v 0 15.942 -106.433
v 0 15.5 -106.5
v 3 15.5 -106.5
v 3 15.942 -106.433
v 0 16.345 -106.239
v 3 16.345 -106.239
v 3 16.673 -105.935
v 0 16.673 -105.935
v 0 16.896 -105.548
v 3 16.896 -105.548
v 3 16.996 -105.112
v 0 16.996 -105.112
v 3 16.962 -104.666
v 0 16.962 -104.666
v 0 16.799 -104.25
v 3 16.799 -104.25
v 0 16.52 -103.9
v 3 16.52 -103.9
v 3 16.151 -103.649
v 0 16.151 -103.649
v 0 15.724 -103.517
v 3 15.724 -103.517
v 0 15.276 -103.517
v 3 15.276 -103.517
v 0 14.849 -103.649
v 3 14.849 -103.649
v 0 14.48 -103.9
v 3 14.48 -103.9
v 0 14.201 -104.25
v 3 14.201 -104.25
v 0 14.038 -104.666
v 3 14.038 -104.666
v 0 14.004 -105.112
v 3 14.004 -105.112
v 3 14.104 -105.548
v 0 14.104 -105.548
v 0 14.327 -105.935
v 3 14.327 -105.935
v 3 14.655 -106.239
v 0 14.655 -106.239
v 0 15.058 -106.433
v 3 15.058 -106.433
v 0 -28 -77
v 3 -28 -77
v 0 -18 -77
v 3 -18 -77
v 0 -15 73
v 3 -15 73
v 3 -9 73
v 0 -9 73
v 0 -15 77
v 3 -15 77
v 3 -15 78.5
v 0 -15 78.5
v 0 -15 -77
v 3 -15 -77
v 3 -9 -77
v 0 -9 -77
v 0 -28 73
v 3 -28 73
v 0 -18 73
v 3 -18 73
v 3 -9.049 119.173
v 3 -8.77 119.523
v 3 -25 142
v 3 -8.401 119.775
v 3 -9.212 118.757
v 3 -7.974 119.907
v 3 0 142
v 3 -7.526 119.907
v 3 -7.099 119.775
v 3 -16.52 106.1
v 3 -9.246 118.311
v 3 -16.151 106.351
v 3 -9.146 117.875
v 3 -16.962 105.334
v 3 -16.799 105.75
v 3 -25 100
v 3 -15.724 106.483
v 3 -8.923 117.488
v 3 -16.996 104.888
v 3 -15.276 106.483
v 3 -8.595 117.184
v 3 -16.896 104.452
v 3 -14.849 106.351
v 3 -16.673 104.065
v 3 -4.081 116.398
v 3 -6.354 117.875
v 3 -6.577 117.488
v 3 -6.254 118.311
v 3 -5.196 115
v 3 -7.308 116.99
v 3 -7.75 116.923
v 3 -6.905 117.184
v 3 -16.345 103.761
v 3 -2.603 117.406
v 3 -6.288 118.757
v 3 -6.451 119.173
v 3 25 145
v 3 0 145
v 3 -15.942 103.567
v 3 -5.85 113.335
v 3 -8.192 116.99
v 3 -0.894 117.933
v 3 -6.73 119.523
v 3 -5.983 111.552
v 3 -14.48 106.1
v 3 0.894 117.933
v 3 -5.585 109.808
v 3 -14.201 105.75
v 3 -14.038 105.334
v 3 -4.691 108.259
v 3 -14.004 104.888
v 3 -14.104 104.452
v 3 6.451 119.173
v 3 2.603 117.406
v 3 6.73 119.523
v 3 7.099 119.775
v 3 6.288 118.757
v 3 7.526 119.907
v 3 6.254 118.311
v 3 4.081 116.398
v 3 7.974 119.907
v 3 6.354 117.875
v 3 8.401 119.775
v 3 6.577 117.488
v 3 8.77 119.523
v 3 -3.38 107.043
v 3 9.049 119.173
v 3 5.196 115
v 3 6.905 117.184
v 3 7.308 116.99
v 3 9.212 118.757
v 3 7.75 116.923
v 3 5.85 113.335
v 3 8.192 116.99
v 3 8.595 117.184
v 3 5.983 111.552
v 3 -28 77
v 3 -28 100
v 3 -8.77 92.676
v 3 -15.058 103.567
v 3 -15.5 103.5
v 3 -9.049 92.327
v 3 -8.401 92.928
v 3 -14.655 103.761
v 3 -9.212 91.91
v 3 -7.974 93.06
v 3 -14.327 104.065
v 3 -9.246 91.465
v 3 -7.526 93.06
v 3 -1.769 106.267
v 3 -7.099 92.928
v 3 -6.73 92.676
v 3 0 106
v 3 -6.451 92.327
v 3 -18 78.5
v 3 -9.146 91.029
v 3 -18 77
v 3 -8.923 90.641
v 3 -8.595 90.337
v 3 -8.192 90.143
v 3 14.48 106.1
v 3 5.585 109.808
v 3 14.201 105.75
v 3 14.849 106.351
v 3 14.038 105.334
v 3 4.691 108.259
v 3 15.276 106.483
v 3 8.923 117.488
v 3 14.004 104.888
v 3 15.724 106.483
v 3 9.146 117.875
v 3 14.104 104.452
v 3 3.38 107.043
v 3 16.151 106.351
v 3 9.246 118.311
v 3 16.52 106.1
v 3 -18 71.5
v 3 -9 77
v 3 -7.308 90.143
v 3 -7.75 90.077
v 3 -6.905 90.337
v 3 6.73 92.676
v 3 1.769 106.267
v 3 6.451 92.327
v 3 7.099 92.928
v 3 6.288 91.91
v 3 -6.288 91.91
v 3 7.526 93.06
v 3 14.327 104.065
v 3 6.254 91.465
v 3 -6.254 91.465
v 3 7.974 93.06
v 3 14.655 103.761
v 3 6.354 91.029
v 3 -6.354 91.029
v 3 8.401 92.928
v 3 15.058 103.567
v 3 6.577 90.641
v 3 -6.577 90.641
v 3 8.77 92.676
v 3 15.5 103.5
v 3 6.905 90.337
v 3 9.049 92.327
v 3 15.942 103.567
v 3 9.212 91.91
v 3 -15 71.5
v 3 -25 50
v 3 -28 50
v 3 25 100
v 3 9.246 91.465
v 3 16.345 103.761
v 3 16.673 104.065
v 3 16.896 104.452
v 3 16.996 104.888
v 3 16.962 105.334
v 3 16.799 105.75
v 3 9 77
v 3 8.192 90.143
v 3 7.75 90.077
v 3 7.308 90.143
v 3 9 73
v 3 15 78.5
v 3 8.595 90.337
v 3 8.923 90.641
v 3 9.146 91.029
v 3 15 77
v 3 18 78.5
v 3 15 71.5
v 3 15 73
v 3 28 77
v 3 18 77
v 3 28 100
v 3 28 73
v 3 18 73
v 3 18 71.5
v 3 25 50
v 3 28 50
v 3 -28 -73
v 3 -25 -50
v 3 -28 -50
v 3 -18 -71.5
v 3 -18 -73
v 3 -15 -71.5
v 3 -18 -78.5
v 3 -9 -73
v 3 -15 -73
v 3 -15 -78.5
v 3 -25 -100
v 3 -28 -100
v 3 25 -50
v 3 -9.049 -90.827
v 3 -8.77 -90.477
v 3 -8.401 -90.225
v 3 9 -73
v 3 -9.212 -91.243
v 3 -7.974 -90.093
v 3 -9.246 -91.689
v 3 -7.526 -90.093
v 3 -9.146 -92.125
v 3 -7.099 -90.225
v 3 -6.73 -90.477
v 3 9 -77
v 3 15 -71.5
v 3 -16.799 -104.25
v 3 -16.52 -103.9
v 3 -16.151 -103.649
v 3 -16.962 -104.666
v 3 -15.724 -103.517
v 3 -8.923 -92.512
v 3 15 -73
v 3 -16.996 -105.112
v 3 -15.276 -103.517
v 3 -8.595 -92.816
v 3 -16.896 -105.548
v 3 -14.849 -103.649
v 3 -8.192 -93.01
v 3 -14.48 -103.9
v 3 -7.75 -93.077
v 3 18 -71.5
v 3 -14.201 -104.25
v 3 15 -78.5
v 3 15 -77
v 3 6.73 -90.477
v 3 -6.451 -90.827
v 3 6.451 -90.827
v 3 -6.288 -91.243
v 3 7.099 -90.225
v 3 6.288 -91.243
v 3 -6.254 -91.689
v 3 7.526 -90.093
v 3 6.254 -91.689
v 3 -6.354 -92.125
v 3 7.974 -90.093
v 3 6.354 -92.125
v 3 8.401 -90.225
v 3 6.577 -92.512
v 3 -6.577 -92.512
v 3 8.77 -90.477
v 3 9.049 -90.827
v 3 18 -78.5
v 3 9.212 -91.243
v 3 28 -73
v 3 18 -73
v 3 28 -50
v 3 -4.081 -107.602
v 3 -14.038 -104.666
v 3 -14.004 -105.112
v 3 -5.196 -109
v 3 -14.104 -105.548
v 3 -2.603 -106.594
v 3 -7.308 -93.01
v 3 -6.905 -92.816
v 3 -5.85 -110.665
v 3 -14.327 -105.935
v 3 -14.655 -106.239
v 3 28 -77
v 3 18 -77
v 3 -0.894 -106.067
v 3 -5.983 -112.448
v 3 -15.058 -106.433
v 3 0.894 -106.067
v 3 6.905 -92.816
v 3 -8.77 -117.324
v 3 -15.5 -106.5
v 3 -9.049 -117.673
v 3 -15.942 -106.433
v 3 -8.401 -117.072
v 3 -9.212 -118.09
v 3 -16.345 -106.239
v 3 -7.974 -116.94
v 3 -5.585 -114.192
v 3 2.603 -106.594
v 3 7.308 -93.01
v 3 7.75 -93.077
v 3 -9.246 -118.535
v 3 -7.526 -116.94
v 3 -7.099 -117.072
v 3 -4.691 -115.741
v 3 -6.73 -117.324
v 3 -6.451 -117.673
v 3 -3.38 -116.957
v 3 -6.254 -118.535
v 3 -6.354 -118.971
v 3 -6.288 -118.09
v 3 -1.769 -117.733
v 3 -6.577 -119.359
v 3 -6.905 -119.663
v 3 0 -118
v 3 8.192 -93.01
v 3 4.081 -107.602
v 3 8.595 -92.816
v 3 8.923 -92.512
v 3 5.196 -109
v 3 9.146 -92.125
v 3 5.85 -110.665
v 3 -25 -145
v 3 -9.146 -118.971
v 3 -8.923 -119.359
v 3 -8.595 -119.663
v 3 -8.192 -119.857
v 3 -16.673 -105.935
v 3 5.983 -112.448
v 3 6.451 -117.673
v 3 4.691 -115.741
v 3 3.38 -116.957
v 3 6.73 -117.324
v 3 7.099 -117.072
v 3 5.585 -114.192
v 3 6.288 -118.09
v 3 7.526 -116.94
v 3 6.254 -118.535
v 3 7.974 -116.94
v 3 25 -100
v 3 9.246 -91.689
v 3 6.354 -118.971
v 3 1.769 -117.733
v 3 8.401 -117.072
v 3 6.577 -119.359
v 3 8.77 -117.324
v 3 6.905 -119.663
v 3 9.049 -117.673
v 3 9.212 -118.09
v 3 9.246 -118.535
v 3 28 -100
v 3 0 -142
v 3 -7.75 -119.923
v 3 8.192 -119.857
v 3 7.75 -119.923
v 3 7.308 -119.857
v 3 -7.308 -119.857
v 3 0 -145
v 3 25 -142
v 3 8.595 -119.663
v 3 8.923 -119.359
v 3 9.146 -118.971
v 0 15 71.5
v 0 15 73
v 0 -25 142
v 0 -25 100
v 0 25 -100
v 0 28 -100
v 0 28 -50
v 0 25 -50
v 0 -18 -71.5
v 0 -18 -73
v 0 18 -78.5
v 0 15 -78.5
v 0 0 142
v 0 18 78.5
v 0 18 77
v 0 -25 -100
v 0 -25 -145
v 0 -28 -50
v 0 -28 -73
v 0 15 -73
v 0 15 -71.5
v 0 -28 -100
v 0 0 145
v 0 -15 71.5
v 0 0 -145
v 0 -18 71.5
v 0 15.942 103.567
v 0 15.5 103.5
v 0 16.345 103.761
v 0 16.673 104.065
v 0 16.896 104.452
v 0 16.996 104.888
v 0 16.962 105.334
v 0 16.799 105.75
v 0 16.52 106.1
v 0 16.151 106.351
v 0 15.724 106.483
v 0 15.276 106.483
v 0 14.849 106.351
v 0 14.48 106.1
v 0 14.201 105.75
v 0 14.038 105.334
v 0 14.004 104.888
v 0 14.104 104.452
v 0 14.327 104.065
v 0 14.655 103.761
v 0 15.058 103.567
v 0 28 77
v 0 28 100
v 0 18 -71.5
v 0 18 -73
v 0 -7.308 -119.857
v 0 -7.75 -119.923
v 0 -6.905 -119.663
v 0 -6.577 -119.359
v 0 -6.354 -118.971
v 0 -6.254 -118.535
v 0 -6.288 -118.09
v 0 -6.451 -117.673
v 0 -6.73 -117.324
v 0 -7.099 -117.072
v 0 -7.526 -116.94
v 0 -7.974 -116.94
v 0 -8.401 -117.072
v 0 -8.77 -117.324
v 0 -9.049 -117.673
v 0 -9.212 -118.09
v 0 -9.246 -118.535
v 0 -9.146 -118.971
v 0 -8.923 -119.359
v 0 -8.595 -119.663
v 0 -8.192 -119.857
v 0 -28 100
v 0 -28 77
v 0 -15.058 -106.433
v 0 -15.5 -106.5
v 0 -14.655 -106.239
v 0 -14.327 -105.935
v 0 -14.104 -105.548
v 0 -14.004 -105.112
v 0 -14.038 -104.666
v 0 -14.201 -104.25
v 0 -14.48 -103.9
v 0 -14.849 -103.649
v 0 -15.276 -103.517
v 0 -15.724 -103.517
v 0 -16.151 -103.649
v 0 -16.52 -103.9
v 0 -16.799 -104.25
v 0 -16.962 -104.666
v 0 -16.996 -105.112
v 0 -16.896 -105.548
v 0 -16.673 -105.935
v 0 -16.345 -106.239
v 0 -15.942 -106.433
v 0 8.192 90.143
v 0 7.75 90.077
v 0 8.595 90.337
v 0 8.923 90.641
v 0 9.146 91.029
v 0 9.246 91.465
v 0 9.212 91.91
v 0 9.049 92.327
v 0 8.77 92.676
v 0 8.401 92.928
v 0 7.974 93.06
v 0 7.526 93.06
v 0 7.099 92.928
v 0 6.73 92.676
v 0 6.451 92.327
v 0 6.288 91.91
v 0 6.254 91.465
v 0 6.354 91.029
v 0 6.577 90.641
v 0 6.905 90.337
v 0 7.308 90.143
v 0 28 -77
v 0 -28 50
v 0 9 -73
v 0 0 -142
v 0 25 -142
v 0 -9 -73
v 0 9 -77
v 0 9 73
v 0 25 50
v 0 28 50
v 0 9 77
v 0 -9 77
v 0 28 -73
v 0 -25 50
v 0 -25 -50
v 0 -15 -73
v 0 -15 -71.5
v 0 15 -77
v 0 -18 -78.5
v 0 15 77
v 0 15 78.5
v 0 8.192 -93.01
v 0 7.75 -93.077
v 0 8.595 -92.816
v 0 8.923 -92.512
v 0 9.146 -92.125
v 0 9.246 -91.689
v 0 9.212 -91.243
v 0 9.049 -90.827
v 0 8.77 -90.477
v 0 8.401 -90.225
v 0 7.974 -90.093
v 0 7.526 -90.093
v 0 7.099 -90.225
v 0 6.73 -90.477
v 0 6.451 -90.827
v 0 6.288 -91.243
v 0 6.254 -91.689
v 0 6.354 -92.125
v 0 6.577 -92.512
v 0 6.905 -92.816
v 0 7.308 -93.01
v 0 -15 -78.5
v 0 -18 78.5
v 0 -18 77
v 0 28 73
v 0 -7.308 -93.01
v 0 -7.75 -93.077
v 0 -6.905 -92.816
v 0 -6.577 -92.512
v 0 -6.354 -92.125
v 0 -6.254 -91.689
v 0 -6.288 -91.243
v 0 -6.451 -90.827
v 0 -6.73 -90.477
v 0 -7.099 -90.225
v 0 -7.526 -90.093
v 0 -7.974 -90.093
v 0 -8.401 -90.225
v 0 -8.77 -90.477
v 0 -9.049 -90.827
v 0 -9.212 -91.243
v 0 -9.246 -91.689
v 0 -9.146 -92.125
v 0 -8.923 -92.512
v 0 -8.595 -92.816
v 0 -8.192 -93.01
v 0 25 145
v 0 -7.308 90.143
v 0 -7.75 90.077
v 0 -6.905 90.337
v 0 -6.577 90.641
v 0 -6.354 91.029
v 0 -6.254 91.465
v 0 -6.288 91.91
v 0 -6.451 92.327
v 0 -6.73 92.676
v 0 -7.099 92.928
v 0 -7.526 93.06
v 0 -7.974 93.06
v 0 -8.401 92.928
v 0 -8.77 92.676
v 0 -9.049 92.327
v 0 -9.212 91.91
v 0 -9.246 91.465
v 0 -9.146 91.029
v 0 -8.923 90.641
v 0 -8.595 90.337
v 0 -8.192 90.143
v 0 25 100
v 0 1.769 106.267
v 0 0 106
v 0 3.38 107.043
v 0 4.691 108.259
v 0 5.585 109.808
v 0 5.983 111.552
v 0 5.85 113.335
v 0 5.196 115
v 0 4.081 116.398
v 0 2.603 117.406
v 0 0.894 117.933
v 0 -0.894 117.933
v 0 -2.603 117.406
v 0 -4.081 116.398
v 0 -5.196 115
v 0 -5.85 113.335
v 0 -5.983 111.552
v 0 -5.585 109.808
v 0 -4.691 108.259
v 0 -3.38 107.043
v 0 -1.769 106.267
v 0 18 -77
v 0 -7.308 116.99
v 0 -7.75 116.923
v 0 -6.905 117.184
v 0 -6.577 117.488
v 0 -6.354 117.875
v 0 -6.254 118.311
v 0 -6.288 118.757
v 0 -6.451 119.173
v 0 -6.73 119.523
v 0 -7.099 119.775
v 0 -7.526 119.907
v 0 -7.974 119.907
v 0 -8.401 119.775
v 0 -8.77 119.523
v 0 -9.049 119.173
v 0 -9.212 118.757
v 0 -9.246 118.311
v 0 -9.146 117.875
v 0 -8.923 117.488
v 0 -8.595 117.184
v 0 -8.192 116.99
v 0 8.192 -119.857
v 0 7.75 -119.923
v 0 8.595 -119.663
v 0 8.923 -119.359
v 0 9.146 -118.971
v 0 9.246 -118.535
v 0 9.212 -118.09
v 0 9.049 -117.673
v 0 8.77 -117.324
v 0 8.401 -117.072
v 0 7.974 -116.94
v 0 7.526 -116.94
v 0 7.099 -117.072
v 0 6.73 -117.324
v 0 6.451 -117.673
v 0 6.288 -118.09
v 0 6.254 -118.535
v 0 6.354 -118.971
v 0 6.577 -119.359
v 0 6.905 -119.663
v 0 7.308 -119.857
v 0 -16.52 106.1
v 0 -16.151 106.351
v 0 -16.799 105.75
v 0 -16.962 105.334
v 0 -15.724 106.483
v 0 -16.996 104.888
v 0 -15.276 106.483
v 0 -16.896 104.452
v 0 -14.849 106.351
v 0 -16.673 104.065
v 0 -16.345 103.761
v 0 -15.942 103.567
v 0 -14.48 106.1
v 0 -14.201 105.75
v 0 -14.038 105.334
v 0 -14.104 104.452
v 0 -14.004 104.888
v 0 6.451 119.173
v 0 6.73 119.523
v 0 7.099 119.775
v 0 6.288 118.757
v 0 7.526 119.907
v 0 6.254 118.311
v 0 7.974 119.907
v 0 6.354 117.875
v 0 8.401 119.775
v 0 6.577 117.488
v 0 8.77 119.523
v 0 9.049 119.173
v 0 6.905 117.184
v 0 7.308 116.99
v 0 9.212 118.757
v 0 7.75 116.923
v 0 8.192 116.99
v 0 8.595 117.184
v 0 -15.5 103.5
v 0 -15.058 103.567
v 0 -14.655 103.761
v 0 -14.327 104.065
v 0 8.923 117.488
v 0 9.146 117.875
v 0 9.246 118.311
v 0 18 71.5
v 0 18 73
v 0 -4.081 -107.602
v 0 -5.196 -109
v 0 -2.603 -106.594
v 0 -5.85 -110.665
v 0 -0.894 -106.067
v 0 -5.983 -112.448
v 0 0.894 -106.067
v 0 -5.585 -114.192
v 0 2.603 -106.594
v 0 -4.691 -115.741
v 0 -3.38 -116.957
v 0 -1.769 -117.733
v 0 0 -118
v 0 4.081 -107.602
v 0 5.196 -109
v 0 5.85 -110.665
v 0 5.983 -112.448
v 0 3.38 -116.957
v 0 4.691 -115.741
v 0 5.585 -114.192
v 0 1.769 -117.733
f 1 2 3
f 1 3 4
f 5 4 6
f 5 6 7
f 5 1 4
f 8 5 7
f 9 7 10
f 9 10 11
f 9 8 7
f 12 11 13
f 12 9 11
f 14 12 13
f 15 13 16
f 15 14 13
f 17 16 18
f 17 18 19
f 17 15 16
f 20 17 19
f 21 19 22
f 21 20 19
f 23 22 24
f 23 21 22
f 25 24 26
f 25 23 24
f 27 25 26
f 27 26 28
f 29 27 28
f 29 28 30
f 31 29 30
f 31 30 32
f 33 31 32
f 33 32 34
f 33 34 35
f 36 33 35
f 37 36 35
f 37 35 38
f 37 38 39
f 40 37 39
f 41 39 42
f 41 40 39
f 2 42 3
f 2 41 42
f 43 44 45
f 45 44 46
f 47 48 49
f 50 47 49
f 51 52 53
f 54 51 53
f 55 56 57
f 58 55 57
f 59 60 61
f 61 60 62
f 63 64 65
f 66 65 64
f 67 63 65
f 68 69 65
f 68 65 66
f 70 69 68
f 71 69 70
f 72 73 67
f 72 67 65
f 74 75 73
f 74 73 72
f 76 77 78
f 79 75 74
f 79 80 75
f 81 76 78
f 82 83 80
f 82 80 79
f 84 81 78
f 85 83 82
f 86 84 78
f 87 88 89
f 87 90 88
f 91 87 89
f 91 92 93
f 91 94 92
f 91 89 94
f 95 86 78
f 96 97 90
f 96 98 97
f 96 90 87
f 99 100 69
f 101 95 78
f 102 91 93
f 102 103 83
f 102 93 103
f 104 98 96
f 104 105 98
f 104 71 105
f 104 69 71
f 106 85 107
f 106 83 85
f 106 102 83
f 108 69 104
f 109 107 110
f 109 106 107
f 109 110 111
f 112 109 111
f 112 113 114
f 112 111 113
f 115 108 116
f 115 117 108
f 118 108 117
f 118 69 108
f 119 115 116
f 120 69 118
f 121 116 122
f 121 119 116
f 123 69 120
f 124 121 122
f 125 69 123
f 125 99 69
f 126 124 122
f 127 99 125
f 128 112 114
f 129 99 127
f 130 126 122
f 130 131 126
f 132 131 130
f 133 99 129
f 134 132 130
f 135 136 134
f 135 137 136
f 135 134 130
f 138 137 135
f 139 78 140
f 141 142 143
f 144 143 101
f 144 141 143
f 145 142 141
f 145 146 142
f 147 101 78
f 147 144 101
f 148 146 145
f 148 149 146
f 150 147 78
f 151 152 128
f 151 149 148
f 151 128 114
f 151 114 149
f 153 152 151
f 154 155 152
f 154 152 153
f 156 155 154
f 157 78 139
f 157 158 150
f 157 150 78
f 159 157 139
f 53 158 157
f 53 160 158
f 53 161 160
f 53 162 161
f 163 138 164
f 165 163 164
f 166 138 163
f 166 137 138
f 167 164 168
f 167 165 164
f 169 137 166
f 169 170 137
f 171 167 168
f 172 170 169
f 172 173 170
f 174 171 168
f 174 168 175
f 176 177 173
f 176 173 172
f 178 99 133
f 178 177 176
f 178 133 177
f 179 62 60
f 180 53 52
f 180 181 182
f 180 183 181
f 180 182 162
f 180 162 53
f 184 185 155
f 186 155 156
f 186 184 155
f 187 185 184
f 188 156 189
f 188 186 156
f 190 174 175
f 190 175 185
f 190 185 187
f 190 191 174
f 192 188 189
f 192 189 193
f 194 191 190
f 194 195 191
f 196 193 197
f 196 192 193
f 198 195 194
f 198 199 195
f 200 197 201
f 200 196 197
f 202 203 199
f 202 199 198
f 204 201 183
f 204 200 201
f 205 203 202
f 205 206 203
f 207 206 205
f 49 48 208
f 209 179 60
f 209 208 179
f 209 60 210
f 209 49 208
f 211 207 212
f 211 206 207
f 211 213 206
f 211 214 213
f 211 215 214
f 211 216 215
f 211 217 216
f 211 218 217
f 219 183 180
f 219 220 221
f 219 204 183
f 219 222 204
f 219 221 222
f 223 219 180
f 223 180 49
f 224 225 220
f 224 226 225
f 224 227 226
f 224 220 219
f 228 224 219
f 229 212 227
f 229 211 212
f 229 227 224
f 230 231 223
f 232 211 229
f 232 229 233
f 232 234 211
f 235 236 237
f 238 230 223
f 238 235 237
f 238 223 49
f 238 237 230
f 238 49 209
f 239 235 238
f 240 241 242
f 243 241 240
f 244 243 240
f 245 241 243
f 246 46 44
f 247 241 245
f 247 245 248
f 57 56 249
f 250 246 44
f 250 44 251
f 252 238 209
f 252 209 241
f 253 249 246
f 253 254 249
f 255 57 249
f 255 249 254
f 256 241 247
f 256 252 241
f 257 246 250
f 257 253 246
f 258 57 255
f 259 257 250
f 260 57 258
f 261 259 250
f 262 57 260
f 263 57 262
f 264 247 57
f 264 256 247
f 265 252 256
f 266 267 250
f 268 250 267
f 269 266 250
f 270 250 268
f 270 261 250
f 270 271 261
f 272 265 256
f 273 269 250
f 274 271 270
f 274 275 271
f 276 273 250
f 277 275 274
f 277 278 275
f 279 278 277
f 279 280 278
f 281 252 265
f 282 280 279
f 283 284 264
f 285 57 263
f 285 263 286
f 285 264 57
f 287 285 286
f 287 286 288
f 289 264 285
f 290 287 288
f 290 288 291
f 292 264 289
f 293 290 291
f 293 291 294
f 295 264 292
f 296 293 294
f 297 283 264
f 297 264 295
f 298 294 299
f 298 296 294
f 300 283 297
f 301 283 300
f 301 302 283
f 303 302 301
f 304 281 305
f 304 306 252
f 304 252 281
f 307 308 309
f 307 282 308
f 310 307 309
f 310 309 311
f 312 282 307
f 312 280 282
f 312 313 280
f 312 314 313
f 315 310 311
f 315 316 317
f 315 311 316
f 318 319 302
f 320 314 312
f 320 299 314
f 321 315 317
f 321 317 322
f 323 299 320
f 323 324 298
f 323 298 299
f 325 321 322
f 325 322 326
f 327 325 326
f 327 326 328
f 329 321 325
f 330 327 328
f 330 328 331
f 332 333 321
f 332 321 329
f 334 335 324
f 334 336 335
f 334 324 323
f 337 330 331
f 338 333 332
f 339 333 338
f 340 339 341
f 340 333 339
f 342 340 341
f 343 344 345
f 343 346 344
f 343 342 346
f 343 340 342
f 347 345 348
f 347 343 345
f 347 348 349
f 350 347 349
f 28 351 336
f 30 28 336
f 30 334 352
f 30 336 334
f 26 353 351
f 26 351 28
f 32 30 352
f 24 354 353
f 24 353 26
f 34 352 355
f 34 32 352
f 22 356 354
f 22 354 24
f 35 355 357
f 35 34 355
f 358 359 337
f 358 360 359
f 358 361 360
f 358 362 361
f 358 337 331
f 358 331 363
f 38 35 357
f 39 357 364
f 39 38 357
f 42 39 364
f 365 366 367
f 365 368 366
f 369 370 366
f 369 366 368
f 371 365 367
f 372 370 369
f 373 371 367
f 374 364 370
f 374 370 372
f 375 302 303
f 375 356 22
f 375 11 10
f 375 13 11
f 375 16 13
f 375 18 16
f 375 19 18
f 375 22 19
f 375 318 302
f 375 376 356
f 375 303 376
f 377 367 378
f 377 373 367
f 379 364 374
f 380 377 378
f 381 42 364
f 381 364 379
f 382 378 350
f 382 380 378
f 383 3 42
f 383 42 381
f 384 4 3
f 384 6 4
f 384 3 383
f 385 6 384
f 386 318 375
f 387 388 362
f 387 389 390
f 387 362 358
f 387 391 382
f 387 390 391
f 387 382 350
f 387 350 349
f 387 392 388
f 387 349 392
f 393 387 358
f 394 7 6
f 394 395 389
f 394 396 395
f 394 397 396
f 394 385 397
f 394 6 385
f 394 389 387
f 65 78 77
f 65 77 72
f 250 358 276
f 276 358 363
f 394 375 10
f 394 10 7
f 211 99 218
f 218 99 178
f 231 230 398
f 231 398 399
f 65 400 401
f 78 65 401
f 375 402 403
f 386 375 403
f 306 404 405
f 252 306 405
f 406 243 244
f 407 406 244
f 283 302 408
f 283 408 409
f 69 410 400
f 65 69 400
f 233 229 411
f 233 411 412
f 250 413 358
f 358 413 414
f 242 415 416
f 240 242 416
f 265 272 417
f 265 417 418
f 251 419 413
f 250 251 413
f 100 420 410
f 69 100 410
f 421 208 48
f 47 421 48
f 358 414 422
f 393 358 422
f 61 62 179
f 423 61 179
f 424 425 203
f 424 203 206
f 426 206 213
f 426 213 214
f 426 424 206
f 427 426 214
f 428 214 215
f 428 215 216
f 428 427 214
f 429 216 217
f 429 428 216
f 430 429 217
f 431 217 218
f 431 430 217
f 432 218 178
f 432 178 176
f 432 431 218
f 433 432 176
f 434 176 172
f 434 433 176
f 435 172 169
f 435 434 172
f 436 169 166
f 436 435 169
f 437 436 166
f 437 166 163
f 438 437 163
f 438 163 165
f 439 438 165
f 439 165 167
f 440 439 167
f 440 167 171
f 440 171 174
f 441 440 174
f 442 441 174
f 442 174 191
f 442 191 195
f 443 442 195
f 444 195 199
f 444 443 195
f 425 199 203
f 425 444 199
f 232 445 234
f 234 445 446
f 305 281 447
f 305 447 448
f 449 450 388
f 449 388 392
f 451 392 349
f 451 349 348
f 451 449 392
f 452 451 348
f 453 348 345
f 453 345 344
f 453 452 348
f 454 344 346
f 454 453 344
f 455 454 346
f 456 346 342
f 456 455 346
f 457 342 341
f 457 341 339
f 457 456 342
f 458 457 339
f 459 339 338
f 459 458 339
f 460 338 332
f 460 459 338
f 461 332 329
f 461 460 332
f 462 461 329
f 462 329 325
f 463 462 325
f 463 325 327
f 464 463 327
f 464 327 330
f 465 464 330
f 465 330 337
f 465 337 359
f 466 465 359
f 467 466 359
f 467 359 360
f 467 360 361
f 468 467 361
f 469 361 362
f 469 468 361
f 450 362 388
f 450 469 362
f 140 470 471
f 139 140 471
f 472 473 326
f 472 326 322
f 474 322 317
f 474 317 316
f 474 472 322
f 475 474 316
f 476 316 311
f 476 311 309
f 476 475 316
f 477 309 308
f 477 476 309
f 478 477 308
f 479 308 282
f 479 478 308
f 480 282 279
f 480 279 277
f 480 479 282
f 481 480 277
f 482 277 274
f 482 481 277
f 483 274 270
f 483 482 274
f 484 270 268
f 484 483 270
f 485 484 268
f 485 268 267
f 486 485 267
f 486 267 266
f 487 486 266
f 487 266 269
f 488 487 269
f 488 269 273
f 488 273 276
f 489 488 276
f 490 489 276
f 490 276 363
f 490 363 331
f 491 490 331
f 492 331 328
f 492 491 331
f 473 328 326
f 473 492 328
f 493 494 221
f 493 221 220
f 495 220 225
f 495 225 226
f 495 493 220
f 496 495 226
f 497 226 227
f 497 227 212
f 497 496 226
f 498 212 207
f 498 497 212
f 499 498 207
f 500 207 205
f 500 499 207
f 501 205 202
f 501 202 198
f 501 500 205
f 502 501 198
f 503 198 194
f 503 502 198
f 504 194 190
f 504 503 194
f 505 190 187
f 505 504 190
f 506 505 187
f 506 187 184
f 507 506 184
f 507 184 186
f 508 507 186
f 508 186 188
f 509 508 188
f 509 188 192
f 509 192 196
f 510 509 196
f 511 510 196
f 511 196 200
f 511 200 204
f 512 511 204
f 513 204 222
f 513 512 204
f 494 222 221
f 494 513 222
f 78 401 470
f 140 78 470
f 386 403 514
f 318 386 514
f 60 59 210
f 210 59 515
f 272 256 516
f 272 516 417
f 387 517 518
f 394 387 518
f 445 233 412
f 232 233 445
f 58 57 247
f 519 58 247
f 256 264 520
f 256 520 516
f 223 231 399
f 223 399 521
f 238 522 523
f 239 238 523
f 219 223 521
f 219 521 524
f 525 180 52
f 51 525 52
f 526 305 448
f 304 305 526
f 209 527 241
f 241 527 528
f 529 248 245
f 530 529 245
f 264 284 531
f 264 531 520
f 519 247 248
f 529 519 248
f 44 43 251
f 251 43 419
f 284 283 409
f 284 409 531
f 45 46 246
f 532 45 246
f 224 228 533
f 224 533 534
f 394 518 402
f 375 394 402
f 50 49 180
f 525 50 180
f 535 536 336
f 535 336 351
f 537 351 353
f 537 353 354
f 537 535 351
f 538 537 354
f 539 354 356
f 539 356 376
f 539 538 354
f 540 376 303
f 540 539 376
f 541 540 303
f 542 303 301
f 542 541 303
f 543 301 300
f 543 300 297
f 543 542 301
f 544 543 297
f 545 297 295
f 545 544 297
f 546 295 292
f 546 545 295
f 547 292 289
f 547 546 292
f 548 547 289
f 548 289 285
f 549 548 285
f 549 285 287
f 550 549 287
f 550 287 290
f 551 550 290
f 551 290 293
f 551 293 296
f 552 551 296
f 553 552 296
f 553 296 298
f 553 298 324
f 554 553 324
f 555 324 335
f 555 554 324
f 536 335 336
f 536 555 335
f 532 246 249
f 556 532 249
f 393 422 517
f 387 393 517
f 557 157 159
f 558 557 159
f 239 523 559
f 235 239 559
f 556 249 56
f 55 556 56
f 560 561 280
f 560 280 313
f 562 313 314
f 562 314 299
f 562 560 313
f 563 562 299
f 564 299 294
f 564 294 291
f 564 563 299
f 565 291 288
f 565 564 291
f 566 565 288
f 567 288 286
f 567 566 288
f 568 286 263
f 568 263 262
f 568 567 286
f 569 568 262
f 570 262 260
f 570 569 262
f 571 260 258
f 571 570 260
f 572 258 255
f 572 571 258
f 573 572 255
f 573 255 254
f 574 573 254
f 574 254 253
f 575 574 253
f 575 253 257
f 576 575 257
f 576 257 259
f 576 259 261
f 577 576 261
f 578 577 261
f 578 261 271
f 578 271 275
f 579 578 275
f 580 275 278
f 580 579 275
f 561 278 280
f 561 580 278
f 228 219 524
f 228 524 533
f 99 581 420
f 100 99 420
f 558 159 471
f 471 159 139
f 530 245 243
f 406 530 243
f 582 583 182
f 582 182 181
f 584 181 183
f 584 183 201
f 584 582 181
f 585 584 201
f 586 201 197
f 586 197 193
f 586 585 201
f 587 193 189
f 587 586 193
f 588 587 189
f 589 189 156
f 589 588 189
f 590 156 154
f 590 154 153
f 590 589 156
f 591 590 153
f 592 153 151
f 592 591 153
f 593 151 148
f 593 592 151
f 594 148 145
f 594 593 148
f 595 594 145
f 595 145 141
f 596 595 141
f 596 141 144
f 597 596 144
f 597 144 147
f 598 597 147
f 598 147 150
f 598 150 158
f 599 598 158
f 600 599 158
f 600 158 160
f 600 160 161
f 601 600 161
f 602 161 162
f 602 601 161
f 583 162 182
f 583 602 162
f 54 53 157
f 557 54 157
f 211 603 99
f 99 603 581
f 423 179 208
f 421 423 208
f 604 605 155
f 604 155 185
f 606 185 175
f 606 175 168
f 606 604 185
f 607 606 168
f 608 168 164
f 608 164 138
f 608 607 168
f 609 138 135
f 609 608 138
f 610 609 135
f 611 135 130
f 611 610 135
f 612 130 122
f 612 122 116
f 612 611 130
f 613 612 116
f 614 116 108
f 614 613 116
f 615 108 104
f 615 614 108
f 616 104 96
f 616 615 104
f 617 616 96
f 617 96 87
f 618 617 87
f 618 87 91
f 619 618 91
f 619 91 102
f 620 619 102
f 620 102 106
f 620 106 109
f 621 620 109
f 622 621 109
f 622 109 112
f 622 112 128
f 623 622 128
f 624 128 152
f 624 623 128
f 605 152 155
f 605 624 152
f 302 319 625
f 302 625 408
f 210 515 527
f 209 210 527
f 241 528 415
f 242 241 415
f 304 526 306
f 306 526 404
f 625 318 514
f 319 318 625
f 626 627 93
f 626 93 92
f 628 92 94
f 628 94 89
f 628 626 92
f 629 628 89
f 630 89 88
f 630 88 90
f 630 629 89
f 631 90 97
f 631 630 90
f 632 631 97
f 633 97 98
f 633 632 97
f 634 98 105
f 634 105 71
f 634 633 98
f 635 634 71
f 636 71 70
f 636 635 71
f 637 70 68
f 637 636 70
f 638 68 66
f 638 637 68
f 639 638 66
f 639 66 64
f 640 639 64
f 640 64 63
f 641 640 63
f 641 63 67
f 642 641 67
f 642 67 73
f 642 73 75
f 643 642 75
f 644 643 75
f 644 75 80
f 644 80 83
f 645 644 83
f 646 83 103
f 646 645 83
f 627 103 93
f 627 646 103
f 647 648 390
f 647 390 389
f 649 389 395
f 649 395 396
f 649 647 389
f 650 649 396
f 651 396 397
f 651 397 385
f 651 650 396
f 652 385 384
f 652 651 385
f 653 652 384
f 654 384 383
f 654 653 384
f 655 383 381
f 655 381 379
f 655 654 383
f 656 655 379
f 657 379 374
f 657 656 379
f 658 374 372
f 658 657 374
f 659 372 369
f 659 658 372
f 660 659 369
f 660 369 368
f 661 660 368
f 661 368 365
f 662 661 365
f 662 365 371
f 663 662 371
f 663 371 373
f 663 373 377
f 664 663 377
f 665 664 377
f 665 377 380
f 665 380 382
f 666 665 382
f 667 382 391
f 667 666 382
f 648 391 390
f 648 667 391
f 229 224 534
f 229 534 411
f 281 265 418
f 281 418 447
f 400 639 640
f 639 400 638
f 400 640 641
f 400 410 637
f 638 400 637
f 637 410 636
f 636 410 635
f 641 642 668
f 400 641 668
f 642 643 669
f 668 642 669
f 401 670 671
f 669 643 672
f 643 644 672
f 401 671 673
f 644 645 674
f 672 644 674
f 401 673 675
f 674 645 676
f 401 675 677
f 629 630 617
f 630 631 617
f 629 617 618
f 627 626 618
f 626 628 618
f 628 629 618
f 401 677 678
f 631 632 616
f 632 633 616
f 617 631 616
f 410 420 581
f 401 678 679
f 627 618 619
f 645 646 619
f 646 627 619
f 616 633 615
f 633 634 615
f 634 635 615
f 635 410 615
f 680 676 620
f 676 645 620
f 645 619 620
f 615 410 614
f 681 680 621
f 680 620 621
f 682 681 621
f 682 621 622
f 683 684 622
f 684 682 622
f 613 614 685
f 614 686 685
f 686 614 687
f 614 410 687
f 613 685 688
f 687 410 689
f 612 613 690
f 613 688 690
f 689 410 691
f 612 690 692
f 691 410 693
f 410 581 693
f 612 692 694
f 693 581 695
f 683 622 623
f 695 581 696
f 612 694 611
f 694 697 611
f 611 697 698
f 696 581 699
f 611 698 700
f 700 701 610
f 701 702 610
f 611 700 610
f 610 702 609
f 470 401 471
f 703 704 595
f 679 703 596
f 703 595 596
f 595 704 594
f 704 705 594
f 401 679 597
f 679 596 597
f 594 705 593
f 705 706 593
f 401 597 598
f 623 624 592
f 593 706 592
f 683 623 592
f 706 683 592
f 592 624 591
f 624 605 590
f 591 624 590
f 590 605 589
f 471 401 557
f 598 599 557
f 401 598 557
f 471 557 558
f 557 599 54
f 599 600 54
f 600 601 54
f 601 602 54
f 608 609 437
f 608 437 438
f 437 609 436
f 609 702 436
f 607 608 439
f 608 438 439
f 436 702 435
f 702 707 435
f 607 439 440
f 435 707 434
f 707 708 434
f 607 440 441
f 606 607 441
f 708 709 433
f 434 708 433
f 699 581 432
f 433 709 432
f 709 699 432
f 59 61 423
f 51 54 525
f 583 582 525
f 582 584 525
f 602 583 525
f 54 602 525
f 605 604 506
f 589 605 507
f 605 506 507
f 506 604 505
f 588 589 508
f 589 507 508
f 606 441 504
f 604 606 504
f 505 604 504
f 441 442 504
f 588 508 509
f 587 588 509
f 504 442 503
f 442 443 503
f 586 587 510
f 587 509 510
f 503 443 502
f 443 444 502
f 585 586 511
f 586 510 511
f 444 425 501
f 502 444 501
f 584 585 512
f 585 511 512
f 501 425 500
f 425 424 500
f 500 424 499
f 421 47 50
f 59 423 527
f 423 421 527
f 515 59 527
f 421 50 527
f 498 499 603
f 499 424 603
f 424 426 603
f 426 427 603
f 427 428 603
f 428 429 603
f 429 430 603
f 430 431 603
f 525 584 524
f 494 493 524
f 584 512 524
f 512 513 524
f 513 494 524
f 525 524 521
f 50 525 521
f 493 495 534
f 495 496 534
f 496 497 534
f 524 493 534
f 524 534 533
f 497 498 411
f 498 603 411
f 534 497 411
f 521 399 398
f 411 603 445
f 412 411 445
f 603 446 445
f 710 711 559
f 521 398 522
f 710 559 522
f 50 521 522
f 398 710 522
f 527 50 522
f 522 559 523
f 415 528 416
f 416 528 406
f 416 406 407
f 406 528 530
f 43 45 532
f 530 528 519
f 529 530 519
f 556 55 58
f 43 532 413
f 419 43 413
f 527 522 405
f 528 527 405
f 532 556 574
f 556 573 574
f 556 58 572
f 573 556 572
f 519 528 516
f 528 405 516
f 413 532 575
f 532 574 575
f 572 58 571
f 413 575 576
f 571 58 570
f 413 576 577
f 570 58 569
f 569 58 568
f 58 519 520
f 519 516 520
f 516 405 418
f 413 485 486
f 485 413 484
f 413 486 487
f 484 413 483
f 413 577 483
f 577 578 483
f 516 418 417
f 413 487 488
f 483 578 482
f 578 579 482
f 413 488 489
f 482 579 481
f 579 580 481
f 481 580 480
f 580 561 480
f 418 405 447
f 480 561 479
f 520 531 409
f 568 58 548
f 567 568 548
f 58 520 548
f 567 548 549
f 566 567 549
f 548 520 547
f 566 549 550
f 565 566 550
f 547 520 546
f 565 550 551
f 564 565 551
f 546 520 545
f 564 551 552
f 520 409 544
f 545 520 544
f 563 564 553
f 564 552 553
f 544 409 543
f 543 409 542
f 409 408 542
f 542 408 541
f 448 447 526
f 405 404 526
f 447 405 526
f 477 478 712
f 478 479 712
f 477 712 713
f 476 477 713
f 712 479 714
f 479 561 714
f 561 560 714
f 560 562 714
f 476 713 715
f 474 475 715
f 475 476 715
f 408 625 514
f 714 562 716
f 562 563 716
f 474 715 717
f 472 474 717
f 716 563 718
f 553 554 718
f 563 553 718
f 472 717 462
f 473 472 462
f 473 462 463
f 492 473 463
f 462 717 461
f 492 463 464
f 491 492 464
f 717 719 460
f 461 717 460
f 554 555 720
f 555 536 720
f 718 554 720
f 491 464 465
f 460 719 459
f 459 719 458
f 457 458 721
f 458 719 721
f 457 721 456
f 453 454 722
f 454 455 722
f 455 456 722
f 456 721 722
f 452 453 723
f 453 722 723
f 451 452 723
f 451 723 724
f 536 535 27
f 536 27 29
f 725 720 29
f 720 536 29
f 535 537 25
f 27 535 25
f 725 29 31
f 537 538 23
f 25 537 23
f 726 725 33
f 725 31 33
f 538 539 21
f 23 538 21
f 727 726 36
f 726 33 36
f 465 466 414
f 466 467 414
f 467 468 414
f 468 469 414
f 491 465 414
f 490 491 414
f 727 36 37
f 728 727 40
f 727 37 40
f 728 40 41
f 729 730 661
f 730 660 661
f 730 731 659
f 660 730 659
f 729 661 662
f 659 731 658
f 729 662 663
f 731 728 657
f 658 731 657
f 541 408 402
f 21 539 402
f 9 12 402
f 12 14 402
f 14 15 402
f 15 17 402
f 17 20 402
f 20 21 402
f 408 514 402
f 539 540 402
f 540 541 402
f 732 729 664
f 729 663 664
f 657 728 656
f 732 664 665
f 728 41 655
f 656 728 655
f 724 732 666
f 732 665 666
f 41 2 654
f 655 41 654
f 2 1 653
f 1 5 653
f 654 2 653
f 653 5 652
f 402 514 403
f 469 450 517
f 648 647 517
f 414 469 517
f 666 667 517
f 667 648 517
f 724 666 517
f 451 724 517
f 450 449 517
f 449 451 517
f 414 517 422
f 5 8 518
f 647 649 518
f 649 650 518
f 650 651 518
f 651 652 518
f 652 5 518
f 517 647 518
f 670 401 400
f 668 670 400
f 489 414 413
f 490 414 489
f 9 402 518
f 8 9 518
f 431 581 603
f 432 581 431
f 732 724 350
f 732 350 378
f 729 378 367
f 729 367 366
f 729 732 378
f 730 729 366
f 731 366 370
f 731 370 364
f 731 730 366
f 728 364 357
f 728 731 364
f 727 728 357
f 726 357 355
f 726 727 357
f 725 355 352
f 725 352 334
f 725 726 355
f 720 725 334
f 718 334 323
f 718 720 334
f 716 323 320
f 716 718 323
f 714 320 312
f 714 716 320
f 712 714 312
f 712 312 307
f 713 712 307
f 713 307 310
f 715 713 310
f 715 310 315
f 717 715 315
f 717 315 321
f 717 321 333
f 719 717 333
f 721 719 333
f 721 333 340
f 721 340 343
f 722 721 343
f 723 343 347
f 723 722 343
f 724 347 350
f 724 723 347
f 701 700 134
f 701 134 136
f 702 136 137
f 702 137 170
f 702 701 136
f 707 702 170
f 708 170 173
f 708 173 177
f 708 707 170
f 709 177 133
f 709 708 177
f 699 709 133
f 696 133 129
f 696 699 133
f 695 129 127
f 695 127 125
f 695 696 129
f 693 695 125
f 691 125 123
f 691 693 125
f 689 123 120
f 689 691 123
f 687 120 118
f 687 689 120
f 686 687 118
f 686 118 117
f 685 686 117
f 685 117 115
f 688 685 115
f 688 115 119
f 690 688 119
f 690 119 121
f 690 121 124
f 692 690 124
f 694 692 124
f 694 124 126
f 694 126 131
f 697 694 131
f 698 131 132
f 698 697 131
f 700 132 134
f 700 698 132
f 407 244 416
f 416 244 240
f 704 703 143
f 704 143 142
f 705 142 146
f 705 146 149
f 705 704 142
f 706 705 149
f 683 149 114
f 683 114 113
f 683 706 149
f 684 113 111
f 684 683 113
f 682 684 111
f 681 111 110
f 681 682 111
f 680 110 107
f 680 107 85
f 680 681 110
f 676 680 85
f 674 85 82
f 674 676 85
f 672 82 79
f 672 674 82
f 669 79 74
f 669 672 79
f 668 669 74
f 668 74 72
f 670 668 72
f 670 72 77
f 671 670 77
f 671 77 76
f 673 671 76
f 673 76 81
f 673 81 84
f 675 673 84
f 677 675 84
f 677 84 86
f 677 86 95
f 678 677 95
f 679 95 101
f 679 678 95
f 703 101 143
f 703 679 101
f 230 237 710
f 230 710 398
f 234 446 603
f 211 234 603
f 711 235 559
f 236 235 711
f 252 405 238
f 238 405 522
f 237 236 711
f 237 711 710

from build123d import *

# Parameters (mm, degrees)
SKETCH1_R           = 6
SKETCH1_R_2         = 1.5
BOSS_EXTRUDE1_DEPTH = 3
CUT_EXTRUDE1_DEPTH  = 3


with BuildPart() as part:
    # Sketch1 → Boss-Extrude1 (new body)
    with BuildSketch(Plane(origin=(0, 0, 0), x_dir=(0, 0, -1), z_dir=(1, 0, 0))):
        Polygon((-145, 0), (-142, 0), (-142, -25), (-100, -25), (-100, -28), (-50, -28), (-50, -25), (50, -25), (50, -28), (100, -28), (100, -25), (145, -25), (145, 0), (142, 0), (142, 25), (100, 25), (100, 28), (50, 28), (50, 25), (-50, 25), (-50, 28), (-100, 28), (-100, 25), (-145, 25), align=None)
        with Locations((-112, 0)):
            Circle(SKETCH1_R, mode=Mode.SUBTRACT)
        with Locations((112, 0)):
            Circle(SKETCH1_R, mode=Mode.SUBTRACT)
        with Locations((-105, 15.5)):
            Circle(SKETCH1_R_2, mode=Mode.SUBTRACT)
        with Locations((-91.576606241, 7.75)):
            Circle(SKETCH1_R_2, mode=Mode.SUBTRACT)
        with Locations((-91.576606241, -7.75)):
            Circle(SKETCH1_R_2, mode=Mode.SUBTRACT)
        with Locations((-105, -15.5)):
            Circle(SKETCH1_R_2, mode=Mode.SUBTRACT)
        with Locations((-118.423393759, -7.75)):
            Circle(SKETCH1_R_2, mode=Mode.SUBTRACT)
        with Locations((-118.423393759, 7.75)):
            Circle(SKETCH1_R_2, mode=Mode.SUBTRACT)
        with Locations((118.423393759, -7.75)):
            Circle(SKETCH1_R_2, mode=Mode.SUBTRACT)
        with Locations((105, -15.5)):
            Circle(SKETCH1_R_2, mode=Mode.SUBTRACT)
        with Locations((91.576606241, -7.75)):
            Circle(SKETCH1_R_2, mode=Mode.SUBTRACT)
        with Locations((91.576606241, 7.75)):
            Circle(SKETCH1_R_2, mode=Mode.SUBTRACT)
        with Locations((105, 15.5)):
            Circle(SKETCH1_R_2, mode=Mode.SUBTRACT)
        with Locations((118.423393759, 7.75)):
            Circle(SKETCH1_R_2, mode=Mode.SUBTRACT)
    extrude(amount=BOSS_EXTRUDE1_DEPTH)

    # Sketch2 → Cut-Extrude1 (cut)
    with BuildSketch(Plane(origin=(3, 0, 0), x_dir=(0, 0, -1), z_dir=(1, 0, 0))):
        Polygon((-75, 28), (-73, 28), (-73, 18), (-71.5, 18), (-71.5, 15), (-73, 15), (-73, 9), (-77, 9), (-77, 15), (-78.5, 15), (-78.5, 18), (-77, 18), (-77, 28), align=None)
        Polygon((-73, -28), (-73, -18), (-71.5, -18), (-71.5, -15), (-73, -15), (-73, -9), (-77, -9), (-77, -15), (-78.5, -15), (-78.5, -18), (-77, -18), (-77, -28), align=None)
        Polygon((75, -28), (77, -28), (77, -18), (78.5, -18), (78.5, -15), (77, -15), (77, -9), (73, -9), (73, -15), (71.5, -15), (71.5, -18), (73, -18), (73, -28), align=None)
        Polygon((77, 28), (77, 18), (78.5, 18), (78.5, 15), (77, 15), (77, 9), (73, 9), (73, 15), (71.5, 15), (71.5, 18), (73, 18), (73, 28), align=None)
    extrude(amount=-CUT_EXTRUDE1_DEPTH, mode=Mode.SUBTRACT)


solid = part.part
